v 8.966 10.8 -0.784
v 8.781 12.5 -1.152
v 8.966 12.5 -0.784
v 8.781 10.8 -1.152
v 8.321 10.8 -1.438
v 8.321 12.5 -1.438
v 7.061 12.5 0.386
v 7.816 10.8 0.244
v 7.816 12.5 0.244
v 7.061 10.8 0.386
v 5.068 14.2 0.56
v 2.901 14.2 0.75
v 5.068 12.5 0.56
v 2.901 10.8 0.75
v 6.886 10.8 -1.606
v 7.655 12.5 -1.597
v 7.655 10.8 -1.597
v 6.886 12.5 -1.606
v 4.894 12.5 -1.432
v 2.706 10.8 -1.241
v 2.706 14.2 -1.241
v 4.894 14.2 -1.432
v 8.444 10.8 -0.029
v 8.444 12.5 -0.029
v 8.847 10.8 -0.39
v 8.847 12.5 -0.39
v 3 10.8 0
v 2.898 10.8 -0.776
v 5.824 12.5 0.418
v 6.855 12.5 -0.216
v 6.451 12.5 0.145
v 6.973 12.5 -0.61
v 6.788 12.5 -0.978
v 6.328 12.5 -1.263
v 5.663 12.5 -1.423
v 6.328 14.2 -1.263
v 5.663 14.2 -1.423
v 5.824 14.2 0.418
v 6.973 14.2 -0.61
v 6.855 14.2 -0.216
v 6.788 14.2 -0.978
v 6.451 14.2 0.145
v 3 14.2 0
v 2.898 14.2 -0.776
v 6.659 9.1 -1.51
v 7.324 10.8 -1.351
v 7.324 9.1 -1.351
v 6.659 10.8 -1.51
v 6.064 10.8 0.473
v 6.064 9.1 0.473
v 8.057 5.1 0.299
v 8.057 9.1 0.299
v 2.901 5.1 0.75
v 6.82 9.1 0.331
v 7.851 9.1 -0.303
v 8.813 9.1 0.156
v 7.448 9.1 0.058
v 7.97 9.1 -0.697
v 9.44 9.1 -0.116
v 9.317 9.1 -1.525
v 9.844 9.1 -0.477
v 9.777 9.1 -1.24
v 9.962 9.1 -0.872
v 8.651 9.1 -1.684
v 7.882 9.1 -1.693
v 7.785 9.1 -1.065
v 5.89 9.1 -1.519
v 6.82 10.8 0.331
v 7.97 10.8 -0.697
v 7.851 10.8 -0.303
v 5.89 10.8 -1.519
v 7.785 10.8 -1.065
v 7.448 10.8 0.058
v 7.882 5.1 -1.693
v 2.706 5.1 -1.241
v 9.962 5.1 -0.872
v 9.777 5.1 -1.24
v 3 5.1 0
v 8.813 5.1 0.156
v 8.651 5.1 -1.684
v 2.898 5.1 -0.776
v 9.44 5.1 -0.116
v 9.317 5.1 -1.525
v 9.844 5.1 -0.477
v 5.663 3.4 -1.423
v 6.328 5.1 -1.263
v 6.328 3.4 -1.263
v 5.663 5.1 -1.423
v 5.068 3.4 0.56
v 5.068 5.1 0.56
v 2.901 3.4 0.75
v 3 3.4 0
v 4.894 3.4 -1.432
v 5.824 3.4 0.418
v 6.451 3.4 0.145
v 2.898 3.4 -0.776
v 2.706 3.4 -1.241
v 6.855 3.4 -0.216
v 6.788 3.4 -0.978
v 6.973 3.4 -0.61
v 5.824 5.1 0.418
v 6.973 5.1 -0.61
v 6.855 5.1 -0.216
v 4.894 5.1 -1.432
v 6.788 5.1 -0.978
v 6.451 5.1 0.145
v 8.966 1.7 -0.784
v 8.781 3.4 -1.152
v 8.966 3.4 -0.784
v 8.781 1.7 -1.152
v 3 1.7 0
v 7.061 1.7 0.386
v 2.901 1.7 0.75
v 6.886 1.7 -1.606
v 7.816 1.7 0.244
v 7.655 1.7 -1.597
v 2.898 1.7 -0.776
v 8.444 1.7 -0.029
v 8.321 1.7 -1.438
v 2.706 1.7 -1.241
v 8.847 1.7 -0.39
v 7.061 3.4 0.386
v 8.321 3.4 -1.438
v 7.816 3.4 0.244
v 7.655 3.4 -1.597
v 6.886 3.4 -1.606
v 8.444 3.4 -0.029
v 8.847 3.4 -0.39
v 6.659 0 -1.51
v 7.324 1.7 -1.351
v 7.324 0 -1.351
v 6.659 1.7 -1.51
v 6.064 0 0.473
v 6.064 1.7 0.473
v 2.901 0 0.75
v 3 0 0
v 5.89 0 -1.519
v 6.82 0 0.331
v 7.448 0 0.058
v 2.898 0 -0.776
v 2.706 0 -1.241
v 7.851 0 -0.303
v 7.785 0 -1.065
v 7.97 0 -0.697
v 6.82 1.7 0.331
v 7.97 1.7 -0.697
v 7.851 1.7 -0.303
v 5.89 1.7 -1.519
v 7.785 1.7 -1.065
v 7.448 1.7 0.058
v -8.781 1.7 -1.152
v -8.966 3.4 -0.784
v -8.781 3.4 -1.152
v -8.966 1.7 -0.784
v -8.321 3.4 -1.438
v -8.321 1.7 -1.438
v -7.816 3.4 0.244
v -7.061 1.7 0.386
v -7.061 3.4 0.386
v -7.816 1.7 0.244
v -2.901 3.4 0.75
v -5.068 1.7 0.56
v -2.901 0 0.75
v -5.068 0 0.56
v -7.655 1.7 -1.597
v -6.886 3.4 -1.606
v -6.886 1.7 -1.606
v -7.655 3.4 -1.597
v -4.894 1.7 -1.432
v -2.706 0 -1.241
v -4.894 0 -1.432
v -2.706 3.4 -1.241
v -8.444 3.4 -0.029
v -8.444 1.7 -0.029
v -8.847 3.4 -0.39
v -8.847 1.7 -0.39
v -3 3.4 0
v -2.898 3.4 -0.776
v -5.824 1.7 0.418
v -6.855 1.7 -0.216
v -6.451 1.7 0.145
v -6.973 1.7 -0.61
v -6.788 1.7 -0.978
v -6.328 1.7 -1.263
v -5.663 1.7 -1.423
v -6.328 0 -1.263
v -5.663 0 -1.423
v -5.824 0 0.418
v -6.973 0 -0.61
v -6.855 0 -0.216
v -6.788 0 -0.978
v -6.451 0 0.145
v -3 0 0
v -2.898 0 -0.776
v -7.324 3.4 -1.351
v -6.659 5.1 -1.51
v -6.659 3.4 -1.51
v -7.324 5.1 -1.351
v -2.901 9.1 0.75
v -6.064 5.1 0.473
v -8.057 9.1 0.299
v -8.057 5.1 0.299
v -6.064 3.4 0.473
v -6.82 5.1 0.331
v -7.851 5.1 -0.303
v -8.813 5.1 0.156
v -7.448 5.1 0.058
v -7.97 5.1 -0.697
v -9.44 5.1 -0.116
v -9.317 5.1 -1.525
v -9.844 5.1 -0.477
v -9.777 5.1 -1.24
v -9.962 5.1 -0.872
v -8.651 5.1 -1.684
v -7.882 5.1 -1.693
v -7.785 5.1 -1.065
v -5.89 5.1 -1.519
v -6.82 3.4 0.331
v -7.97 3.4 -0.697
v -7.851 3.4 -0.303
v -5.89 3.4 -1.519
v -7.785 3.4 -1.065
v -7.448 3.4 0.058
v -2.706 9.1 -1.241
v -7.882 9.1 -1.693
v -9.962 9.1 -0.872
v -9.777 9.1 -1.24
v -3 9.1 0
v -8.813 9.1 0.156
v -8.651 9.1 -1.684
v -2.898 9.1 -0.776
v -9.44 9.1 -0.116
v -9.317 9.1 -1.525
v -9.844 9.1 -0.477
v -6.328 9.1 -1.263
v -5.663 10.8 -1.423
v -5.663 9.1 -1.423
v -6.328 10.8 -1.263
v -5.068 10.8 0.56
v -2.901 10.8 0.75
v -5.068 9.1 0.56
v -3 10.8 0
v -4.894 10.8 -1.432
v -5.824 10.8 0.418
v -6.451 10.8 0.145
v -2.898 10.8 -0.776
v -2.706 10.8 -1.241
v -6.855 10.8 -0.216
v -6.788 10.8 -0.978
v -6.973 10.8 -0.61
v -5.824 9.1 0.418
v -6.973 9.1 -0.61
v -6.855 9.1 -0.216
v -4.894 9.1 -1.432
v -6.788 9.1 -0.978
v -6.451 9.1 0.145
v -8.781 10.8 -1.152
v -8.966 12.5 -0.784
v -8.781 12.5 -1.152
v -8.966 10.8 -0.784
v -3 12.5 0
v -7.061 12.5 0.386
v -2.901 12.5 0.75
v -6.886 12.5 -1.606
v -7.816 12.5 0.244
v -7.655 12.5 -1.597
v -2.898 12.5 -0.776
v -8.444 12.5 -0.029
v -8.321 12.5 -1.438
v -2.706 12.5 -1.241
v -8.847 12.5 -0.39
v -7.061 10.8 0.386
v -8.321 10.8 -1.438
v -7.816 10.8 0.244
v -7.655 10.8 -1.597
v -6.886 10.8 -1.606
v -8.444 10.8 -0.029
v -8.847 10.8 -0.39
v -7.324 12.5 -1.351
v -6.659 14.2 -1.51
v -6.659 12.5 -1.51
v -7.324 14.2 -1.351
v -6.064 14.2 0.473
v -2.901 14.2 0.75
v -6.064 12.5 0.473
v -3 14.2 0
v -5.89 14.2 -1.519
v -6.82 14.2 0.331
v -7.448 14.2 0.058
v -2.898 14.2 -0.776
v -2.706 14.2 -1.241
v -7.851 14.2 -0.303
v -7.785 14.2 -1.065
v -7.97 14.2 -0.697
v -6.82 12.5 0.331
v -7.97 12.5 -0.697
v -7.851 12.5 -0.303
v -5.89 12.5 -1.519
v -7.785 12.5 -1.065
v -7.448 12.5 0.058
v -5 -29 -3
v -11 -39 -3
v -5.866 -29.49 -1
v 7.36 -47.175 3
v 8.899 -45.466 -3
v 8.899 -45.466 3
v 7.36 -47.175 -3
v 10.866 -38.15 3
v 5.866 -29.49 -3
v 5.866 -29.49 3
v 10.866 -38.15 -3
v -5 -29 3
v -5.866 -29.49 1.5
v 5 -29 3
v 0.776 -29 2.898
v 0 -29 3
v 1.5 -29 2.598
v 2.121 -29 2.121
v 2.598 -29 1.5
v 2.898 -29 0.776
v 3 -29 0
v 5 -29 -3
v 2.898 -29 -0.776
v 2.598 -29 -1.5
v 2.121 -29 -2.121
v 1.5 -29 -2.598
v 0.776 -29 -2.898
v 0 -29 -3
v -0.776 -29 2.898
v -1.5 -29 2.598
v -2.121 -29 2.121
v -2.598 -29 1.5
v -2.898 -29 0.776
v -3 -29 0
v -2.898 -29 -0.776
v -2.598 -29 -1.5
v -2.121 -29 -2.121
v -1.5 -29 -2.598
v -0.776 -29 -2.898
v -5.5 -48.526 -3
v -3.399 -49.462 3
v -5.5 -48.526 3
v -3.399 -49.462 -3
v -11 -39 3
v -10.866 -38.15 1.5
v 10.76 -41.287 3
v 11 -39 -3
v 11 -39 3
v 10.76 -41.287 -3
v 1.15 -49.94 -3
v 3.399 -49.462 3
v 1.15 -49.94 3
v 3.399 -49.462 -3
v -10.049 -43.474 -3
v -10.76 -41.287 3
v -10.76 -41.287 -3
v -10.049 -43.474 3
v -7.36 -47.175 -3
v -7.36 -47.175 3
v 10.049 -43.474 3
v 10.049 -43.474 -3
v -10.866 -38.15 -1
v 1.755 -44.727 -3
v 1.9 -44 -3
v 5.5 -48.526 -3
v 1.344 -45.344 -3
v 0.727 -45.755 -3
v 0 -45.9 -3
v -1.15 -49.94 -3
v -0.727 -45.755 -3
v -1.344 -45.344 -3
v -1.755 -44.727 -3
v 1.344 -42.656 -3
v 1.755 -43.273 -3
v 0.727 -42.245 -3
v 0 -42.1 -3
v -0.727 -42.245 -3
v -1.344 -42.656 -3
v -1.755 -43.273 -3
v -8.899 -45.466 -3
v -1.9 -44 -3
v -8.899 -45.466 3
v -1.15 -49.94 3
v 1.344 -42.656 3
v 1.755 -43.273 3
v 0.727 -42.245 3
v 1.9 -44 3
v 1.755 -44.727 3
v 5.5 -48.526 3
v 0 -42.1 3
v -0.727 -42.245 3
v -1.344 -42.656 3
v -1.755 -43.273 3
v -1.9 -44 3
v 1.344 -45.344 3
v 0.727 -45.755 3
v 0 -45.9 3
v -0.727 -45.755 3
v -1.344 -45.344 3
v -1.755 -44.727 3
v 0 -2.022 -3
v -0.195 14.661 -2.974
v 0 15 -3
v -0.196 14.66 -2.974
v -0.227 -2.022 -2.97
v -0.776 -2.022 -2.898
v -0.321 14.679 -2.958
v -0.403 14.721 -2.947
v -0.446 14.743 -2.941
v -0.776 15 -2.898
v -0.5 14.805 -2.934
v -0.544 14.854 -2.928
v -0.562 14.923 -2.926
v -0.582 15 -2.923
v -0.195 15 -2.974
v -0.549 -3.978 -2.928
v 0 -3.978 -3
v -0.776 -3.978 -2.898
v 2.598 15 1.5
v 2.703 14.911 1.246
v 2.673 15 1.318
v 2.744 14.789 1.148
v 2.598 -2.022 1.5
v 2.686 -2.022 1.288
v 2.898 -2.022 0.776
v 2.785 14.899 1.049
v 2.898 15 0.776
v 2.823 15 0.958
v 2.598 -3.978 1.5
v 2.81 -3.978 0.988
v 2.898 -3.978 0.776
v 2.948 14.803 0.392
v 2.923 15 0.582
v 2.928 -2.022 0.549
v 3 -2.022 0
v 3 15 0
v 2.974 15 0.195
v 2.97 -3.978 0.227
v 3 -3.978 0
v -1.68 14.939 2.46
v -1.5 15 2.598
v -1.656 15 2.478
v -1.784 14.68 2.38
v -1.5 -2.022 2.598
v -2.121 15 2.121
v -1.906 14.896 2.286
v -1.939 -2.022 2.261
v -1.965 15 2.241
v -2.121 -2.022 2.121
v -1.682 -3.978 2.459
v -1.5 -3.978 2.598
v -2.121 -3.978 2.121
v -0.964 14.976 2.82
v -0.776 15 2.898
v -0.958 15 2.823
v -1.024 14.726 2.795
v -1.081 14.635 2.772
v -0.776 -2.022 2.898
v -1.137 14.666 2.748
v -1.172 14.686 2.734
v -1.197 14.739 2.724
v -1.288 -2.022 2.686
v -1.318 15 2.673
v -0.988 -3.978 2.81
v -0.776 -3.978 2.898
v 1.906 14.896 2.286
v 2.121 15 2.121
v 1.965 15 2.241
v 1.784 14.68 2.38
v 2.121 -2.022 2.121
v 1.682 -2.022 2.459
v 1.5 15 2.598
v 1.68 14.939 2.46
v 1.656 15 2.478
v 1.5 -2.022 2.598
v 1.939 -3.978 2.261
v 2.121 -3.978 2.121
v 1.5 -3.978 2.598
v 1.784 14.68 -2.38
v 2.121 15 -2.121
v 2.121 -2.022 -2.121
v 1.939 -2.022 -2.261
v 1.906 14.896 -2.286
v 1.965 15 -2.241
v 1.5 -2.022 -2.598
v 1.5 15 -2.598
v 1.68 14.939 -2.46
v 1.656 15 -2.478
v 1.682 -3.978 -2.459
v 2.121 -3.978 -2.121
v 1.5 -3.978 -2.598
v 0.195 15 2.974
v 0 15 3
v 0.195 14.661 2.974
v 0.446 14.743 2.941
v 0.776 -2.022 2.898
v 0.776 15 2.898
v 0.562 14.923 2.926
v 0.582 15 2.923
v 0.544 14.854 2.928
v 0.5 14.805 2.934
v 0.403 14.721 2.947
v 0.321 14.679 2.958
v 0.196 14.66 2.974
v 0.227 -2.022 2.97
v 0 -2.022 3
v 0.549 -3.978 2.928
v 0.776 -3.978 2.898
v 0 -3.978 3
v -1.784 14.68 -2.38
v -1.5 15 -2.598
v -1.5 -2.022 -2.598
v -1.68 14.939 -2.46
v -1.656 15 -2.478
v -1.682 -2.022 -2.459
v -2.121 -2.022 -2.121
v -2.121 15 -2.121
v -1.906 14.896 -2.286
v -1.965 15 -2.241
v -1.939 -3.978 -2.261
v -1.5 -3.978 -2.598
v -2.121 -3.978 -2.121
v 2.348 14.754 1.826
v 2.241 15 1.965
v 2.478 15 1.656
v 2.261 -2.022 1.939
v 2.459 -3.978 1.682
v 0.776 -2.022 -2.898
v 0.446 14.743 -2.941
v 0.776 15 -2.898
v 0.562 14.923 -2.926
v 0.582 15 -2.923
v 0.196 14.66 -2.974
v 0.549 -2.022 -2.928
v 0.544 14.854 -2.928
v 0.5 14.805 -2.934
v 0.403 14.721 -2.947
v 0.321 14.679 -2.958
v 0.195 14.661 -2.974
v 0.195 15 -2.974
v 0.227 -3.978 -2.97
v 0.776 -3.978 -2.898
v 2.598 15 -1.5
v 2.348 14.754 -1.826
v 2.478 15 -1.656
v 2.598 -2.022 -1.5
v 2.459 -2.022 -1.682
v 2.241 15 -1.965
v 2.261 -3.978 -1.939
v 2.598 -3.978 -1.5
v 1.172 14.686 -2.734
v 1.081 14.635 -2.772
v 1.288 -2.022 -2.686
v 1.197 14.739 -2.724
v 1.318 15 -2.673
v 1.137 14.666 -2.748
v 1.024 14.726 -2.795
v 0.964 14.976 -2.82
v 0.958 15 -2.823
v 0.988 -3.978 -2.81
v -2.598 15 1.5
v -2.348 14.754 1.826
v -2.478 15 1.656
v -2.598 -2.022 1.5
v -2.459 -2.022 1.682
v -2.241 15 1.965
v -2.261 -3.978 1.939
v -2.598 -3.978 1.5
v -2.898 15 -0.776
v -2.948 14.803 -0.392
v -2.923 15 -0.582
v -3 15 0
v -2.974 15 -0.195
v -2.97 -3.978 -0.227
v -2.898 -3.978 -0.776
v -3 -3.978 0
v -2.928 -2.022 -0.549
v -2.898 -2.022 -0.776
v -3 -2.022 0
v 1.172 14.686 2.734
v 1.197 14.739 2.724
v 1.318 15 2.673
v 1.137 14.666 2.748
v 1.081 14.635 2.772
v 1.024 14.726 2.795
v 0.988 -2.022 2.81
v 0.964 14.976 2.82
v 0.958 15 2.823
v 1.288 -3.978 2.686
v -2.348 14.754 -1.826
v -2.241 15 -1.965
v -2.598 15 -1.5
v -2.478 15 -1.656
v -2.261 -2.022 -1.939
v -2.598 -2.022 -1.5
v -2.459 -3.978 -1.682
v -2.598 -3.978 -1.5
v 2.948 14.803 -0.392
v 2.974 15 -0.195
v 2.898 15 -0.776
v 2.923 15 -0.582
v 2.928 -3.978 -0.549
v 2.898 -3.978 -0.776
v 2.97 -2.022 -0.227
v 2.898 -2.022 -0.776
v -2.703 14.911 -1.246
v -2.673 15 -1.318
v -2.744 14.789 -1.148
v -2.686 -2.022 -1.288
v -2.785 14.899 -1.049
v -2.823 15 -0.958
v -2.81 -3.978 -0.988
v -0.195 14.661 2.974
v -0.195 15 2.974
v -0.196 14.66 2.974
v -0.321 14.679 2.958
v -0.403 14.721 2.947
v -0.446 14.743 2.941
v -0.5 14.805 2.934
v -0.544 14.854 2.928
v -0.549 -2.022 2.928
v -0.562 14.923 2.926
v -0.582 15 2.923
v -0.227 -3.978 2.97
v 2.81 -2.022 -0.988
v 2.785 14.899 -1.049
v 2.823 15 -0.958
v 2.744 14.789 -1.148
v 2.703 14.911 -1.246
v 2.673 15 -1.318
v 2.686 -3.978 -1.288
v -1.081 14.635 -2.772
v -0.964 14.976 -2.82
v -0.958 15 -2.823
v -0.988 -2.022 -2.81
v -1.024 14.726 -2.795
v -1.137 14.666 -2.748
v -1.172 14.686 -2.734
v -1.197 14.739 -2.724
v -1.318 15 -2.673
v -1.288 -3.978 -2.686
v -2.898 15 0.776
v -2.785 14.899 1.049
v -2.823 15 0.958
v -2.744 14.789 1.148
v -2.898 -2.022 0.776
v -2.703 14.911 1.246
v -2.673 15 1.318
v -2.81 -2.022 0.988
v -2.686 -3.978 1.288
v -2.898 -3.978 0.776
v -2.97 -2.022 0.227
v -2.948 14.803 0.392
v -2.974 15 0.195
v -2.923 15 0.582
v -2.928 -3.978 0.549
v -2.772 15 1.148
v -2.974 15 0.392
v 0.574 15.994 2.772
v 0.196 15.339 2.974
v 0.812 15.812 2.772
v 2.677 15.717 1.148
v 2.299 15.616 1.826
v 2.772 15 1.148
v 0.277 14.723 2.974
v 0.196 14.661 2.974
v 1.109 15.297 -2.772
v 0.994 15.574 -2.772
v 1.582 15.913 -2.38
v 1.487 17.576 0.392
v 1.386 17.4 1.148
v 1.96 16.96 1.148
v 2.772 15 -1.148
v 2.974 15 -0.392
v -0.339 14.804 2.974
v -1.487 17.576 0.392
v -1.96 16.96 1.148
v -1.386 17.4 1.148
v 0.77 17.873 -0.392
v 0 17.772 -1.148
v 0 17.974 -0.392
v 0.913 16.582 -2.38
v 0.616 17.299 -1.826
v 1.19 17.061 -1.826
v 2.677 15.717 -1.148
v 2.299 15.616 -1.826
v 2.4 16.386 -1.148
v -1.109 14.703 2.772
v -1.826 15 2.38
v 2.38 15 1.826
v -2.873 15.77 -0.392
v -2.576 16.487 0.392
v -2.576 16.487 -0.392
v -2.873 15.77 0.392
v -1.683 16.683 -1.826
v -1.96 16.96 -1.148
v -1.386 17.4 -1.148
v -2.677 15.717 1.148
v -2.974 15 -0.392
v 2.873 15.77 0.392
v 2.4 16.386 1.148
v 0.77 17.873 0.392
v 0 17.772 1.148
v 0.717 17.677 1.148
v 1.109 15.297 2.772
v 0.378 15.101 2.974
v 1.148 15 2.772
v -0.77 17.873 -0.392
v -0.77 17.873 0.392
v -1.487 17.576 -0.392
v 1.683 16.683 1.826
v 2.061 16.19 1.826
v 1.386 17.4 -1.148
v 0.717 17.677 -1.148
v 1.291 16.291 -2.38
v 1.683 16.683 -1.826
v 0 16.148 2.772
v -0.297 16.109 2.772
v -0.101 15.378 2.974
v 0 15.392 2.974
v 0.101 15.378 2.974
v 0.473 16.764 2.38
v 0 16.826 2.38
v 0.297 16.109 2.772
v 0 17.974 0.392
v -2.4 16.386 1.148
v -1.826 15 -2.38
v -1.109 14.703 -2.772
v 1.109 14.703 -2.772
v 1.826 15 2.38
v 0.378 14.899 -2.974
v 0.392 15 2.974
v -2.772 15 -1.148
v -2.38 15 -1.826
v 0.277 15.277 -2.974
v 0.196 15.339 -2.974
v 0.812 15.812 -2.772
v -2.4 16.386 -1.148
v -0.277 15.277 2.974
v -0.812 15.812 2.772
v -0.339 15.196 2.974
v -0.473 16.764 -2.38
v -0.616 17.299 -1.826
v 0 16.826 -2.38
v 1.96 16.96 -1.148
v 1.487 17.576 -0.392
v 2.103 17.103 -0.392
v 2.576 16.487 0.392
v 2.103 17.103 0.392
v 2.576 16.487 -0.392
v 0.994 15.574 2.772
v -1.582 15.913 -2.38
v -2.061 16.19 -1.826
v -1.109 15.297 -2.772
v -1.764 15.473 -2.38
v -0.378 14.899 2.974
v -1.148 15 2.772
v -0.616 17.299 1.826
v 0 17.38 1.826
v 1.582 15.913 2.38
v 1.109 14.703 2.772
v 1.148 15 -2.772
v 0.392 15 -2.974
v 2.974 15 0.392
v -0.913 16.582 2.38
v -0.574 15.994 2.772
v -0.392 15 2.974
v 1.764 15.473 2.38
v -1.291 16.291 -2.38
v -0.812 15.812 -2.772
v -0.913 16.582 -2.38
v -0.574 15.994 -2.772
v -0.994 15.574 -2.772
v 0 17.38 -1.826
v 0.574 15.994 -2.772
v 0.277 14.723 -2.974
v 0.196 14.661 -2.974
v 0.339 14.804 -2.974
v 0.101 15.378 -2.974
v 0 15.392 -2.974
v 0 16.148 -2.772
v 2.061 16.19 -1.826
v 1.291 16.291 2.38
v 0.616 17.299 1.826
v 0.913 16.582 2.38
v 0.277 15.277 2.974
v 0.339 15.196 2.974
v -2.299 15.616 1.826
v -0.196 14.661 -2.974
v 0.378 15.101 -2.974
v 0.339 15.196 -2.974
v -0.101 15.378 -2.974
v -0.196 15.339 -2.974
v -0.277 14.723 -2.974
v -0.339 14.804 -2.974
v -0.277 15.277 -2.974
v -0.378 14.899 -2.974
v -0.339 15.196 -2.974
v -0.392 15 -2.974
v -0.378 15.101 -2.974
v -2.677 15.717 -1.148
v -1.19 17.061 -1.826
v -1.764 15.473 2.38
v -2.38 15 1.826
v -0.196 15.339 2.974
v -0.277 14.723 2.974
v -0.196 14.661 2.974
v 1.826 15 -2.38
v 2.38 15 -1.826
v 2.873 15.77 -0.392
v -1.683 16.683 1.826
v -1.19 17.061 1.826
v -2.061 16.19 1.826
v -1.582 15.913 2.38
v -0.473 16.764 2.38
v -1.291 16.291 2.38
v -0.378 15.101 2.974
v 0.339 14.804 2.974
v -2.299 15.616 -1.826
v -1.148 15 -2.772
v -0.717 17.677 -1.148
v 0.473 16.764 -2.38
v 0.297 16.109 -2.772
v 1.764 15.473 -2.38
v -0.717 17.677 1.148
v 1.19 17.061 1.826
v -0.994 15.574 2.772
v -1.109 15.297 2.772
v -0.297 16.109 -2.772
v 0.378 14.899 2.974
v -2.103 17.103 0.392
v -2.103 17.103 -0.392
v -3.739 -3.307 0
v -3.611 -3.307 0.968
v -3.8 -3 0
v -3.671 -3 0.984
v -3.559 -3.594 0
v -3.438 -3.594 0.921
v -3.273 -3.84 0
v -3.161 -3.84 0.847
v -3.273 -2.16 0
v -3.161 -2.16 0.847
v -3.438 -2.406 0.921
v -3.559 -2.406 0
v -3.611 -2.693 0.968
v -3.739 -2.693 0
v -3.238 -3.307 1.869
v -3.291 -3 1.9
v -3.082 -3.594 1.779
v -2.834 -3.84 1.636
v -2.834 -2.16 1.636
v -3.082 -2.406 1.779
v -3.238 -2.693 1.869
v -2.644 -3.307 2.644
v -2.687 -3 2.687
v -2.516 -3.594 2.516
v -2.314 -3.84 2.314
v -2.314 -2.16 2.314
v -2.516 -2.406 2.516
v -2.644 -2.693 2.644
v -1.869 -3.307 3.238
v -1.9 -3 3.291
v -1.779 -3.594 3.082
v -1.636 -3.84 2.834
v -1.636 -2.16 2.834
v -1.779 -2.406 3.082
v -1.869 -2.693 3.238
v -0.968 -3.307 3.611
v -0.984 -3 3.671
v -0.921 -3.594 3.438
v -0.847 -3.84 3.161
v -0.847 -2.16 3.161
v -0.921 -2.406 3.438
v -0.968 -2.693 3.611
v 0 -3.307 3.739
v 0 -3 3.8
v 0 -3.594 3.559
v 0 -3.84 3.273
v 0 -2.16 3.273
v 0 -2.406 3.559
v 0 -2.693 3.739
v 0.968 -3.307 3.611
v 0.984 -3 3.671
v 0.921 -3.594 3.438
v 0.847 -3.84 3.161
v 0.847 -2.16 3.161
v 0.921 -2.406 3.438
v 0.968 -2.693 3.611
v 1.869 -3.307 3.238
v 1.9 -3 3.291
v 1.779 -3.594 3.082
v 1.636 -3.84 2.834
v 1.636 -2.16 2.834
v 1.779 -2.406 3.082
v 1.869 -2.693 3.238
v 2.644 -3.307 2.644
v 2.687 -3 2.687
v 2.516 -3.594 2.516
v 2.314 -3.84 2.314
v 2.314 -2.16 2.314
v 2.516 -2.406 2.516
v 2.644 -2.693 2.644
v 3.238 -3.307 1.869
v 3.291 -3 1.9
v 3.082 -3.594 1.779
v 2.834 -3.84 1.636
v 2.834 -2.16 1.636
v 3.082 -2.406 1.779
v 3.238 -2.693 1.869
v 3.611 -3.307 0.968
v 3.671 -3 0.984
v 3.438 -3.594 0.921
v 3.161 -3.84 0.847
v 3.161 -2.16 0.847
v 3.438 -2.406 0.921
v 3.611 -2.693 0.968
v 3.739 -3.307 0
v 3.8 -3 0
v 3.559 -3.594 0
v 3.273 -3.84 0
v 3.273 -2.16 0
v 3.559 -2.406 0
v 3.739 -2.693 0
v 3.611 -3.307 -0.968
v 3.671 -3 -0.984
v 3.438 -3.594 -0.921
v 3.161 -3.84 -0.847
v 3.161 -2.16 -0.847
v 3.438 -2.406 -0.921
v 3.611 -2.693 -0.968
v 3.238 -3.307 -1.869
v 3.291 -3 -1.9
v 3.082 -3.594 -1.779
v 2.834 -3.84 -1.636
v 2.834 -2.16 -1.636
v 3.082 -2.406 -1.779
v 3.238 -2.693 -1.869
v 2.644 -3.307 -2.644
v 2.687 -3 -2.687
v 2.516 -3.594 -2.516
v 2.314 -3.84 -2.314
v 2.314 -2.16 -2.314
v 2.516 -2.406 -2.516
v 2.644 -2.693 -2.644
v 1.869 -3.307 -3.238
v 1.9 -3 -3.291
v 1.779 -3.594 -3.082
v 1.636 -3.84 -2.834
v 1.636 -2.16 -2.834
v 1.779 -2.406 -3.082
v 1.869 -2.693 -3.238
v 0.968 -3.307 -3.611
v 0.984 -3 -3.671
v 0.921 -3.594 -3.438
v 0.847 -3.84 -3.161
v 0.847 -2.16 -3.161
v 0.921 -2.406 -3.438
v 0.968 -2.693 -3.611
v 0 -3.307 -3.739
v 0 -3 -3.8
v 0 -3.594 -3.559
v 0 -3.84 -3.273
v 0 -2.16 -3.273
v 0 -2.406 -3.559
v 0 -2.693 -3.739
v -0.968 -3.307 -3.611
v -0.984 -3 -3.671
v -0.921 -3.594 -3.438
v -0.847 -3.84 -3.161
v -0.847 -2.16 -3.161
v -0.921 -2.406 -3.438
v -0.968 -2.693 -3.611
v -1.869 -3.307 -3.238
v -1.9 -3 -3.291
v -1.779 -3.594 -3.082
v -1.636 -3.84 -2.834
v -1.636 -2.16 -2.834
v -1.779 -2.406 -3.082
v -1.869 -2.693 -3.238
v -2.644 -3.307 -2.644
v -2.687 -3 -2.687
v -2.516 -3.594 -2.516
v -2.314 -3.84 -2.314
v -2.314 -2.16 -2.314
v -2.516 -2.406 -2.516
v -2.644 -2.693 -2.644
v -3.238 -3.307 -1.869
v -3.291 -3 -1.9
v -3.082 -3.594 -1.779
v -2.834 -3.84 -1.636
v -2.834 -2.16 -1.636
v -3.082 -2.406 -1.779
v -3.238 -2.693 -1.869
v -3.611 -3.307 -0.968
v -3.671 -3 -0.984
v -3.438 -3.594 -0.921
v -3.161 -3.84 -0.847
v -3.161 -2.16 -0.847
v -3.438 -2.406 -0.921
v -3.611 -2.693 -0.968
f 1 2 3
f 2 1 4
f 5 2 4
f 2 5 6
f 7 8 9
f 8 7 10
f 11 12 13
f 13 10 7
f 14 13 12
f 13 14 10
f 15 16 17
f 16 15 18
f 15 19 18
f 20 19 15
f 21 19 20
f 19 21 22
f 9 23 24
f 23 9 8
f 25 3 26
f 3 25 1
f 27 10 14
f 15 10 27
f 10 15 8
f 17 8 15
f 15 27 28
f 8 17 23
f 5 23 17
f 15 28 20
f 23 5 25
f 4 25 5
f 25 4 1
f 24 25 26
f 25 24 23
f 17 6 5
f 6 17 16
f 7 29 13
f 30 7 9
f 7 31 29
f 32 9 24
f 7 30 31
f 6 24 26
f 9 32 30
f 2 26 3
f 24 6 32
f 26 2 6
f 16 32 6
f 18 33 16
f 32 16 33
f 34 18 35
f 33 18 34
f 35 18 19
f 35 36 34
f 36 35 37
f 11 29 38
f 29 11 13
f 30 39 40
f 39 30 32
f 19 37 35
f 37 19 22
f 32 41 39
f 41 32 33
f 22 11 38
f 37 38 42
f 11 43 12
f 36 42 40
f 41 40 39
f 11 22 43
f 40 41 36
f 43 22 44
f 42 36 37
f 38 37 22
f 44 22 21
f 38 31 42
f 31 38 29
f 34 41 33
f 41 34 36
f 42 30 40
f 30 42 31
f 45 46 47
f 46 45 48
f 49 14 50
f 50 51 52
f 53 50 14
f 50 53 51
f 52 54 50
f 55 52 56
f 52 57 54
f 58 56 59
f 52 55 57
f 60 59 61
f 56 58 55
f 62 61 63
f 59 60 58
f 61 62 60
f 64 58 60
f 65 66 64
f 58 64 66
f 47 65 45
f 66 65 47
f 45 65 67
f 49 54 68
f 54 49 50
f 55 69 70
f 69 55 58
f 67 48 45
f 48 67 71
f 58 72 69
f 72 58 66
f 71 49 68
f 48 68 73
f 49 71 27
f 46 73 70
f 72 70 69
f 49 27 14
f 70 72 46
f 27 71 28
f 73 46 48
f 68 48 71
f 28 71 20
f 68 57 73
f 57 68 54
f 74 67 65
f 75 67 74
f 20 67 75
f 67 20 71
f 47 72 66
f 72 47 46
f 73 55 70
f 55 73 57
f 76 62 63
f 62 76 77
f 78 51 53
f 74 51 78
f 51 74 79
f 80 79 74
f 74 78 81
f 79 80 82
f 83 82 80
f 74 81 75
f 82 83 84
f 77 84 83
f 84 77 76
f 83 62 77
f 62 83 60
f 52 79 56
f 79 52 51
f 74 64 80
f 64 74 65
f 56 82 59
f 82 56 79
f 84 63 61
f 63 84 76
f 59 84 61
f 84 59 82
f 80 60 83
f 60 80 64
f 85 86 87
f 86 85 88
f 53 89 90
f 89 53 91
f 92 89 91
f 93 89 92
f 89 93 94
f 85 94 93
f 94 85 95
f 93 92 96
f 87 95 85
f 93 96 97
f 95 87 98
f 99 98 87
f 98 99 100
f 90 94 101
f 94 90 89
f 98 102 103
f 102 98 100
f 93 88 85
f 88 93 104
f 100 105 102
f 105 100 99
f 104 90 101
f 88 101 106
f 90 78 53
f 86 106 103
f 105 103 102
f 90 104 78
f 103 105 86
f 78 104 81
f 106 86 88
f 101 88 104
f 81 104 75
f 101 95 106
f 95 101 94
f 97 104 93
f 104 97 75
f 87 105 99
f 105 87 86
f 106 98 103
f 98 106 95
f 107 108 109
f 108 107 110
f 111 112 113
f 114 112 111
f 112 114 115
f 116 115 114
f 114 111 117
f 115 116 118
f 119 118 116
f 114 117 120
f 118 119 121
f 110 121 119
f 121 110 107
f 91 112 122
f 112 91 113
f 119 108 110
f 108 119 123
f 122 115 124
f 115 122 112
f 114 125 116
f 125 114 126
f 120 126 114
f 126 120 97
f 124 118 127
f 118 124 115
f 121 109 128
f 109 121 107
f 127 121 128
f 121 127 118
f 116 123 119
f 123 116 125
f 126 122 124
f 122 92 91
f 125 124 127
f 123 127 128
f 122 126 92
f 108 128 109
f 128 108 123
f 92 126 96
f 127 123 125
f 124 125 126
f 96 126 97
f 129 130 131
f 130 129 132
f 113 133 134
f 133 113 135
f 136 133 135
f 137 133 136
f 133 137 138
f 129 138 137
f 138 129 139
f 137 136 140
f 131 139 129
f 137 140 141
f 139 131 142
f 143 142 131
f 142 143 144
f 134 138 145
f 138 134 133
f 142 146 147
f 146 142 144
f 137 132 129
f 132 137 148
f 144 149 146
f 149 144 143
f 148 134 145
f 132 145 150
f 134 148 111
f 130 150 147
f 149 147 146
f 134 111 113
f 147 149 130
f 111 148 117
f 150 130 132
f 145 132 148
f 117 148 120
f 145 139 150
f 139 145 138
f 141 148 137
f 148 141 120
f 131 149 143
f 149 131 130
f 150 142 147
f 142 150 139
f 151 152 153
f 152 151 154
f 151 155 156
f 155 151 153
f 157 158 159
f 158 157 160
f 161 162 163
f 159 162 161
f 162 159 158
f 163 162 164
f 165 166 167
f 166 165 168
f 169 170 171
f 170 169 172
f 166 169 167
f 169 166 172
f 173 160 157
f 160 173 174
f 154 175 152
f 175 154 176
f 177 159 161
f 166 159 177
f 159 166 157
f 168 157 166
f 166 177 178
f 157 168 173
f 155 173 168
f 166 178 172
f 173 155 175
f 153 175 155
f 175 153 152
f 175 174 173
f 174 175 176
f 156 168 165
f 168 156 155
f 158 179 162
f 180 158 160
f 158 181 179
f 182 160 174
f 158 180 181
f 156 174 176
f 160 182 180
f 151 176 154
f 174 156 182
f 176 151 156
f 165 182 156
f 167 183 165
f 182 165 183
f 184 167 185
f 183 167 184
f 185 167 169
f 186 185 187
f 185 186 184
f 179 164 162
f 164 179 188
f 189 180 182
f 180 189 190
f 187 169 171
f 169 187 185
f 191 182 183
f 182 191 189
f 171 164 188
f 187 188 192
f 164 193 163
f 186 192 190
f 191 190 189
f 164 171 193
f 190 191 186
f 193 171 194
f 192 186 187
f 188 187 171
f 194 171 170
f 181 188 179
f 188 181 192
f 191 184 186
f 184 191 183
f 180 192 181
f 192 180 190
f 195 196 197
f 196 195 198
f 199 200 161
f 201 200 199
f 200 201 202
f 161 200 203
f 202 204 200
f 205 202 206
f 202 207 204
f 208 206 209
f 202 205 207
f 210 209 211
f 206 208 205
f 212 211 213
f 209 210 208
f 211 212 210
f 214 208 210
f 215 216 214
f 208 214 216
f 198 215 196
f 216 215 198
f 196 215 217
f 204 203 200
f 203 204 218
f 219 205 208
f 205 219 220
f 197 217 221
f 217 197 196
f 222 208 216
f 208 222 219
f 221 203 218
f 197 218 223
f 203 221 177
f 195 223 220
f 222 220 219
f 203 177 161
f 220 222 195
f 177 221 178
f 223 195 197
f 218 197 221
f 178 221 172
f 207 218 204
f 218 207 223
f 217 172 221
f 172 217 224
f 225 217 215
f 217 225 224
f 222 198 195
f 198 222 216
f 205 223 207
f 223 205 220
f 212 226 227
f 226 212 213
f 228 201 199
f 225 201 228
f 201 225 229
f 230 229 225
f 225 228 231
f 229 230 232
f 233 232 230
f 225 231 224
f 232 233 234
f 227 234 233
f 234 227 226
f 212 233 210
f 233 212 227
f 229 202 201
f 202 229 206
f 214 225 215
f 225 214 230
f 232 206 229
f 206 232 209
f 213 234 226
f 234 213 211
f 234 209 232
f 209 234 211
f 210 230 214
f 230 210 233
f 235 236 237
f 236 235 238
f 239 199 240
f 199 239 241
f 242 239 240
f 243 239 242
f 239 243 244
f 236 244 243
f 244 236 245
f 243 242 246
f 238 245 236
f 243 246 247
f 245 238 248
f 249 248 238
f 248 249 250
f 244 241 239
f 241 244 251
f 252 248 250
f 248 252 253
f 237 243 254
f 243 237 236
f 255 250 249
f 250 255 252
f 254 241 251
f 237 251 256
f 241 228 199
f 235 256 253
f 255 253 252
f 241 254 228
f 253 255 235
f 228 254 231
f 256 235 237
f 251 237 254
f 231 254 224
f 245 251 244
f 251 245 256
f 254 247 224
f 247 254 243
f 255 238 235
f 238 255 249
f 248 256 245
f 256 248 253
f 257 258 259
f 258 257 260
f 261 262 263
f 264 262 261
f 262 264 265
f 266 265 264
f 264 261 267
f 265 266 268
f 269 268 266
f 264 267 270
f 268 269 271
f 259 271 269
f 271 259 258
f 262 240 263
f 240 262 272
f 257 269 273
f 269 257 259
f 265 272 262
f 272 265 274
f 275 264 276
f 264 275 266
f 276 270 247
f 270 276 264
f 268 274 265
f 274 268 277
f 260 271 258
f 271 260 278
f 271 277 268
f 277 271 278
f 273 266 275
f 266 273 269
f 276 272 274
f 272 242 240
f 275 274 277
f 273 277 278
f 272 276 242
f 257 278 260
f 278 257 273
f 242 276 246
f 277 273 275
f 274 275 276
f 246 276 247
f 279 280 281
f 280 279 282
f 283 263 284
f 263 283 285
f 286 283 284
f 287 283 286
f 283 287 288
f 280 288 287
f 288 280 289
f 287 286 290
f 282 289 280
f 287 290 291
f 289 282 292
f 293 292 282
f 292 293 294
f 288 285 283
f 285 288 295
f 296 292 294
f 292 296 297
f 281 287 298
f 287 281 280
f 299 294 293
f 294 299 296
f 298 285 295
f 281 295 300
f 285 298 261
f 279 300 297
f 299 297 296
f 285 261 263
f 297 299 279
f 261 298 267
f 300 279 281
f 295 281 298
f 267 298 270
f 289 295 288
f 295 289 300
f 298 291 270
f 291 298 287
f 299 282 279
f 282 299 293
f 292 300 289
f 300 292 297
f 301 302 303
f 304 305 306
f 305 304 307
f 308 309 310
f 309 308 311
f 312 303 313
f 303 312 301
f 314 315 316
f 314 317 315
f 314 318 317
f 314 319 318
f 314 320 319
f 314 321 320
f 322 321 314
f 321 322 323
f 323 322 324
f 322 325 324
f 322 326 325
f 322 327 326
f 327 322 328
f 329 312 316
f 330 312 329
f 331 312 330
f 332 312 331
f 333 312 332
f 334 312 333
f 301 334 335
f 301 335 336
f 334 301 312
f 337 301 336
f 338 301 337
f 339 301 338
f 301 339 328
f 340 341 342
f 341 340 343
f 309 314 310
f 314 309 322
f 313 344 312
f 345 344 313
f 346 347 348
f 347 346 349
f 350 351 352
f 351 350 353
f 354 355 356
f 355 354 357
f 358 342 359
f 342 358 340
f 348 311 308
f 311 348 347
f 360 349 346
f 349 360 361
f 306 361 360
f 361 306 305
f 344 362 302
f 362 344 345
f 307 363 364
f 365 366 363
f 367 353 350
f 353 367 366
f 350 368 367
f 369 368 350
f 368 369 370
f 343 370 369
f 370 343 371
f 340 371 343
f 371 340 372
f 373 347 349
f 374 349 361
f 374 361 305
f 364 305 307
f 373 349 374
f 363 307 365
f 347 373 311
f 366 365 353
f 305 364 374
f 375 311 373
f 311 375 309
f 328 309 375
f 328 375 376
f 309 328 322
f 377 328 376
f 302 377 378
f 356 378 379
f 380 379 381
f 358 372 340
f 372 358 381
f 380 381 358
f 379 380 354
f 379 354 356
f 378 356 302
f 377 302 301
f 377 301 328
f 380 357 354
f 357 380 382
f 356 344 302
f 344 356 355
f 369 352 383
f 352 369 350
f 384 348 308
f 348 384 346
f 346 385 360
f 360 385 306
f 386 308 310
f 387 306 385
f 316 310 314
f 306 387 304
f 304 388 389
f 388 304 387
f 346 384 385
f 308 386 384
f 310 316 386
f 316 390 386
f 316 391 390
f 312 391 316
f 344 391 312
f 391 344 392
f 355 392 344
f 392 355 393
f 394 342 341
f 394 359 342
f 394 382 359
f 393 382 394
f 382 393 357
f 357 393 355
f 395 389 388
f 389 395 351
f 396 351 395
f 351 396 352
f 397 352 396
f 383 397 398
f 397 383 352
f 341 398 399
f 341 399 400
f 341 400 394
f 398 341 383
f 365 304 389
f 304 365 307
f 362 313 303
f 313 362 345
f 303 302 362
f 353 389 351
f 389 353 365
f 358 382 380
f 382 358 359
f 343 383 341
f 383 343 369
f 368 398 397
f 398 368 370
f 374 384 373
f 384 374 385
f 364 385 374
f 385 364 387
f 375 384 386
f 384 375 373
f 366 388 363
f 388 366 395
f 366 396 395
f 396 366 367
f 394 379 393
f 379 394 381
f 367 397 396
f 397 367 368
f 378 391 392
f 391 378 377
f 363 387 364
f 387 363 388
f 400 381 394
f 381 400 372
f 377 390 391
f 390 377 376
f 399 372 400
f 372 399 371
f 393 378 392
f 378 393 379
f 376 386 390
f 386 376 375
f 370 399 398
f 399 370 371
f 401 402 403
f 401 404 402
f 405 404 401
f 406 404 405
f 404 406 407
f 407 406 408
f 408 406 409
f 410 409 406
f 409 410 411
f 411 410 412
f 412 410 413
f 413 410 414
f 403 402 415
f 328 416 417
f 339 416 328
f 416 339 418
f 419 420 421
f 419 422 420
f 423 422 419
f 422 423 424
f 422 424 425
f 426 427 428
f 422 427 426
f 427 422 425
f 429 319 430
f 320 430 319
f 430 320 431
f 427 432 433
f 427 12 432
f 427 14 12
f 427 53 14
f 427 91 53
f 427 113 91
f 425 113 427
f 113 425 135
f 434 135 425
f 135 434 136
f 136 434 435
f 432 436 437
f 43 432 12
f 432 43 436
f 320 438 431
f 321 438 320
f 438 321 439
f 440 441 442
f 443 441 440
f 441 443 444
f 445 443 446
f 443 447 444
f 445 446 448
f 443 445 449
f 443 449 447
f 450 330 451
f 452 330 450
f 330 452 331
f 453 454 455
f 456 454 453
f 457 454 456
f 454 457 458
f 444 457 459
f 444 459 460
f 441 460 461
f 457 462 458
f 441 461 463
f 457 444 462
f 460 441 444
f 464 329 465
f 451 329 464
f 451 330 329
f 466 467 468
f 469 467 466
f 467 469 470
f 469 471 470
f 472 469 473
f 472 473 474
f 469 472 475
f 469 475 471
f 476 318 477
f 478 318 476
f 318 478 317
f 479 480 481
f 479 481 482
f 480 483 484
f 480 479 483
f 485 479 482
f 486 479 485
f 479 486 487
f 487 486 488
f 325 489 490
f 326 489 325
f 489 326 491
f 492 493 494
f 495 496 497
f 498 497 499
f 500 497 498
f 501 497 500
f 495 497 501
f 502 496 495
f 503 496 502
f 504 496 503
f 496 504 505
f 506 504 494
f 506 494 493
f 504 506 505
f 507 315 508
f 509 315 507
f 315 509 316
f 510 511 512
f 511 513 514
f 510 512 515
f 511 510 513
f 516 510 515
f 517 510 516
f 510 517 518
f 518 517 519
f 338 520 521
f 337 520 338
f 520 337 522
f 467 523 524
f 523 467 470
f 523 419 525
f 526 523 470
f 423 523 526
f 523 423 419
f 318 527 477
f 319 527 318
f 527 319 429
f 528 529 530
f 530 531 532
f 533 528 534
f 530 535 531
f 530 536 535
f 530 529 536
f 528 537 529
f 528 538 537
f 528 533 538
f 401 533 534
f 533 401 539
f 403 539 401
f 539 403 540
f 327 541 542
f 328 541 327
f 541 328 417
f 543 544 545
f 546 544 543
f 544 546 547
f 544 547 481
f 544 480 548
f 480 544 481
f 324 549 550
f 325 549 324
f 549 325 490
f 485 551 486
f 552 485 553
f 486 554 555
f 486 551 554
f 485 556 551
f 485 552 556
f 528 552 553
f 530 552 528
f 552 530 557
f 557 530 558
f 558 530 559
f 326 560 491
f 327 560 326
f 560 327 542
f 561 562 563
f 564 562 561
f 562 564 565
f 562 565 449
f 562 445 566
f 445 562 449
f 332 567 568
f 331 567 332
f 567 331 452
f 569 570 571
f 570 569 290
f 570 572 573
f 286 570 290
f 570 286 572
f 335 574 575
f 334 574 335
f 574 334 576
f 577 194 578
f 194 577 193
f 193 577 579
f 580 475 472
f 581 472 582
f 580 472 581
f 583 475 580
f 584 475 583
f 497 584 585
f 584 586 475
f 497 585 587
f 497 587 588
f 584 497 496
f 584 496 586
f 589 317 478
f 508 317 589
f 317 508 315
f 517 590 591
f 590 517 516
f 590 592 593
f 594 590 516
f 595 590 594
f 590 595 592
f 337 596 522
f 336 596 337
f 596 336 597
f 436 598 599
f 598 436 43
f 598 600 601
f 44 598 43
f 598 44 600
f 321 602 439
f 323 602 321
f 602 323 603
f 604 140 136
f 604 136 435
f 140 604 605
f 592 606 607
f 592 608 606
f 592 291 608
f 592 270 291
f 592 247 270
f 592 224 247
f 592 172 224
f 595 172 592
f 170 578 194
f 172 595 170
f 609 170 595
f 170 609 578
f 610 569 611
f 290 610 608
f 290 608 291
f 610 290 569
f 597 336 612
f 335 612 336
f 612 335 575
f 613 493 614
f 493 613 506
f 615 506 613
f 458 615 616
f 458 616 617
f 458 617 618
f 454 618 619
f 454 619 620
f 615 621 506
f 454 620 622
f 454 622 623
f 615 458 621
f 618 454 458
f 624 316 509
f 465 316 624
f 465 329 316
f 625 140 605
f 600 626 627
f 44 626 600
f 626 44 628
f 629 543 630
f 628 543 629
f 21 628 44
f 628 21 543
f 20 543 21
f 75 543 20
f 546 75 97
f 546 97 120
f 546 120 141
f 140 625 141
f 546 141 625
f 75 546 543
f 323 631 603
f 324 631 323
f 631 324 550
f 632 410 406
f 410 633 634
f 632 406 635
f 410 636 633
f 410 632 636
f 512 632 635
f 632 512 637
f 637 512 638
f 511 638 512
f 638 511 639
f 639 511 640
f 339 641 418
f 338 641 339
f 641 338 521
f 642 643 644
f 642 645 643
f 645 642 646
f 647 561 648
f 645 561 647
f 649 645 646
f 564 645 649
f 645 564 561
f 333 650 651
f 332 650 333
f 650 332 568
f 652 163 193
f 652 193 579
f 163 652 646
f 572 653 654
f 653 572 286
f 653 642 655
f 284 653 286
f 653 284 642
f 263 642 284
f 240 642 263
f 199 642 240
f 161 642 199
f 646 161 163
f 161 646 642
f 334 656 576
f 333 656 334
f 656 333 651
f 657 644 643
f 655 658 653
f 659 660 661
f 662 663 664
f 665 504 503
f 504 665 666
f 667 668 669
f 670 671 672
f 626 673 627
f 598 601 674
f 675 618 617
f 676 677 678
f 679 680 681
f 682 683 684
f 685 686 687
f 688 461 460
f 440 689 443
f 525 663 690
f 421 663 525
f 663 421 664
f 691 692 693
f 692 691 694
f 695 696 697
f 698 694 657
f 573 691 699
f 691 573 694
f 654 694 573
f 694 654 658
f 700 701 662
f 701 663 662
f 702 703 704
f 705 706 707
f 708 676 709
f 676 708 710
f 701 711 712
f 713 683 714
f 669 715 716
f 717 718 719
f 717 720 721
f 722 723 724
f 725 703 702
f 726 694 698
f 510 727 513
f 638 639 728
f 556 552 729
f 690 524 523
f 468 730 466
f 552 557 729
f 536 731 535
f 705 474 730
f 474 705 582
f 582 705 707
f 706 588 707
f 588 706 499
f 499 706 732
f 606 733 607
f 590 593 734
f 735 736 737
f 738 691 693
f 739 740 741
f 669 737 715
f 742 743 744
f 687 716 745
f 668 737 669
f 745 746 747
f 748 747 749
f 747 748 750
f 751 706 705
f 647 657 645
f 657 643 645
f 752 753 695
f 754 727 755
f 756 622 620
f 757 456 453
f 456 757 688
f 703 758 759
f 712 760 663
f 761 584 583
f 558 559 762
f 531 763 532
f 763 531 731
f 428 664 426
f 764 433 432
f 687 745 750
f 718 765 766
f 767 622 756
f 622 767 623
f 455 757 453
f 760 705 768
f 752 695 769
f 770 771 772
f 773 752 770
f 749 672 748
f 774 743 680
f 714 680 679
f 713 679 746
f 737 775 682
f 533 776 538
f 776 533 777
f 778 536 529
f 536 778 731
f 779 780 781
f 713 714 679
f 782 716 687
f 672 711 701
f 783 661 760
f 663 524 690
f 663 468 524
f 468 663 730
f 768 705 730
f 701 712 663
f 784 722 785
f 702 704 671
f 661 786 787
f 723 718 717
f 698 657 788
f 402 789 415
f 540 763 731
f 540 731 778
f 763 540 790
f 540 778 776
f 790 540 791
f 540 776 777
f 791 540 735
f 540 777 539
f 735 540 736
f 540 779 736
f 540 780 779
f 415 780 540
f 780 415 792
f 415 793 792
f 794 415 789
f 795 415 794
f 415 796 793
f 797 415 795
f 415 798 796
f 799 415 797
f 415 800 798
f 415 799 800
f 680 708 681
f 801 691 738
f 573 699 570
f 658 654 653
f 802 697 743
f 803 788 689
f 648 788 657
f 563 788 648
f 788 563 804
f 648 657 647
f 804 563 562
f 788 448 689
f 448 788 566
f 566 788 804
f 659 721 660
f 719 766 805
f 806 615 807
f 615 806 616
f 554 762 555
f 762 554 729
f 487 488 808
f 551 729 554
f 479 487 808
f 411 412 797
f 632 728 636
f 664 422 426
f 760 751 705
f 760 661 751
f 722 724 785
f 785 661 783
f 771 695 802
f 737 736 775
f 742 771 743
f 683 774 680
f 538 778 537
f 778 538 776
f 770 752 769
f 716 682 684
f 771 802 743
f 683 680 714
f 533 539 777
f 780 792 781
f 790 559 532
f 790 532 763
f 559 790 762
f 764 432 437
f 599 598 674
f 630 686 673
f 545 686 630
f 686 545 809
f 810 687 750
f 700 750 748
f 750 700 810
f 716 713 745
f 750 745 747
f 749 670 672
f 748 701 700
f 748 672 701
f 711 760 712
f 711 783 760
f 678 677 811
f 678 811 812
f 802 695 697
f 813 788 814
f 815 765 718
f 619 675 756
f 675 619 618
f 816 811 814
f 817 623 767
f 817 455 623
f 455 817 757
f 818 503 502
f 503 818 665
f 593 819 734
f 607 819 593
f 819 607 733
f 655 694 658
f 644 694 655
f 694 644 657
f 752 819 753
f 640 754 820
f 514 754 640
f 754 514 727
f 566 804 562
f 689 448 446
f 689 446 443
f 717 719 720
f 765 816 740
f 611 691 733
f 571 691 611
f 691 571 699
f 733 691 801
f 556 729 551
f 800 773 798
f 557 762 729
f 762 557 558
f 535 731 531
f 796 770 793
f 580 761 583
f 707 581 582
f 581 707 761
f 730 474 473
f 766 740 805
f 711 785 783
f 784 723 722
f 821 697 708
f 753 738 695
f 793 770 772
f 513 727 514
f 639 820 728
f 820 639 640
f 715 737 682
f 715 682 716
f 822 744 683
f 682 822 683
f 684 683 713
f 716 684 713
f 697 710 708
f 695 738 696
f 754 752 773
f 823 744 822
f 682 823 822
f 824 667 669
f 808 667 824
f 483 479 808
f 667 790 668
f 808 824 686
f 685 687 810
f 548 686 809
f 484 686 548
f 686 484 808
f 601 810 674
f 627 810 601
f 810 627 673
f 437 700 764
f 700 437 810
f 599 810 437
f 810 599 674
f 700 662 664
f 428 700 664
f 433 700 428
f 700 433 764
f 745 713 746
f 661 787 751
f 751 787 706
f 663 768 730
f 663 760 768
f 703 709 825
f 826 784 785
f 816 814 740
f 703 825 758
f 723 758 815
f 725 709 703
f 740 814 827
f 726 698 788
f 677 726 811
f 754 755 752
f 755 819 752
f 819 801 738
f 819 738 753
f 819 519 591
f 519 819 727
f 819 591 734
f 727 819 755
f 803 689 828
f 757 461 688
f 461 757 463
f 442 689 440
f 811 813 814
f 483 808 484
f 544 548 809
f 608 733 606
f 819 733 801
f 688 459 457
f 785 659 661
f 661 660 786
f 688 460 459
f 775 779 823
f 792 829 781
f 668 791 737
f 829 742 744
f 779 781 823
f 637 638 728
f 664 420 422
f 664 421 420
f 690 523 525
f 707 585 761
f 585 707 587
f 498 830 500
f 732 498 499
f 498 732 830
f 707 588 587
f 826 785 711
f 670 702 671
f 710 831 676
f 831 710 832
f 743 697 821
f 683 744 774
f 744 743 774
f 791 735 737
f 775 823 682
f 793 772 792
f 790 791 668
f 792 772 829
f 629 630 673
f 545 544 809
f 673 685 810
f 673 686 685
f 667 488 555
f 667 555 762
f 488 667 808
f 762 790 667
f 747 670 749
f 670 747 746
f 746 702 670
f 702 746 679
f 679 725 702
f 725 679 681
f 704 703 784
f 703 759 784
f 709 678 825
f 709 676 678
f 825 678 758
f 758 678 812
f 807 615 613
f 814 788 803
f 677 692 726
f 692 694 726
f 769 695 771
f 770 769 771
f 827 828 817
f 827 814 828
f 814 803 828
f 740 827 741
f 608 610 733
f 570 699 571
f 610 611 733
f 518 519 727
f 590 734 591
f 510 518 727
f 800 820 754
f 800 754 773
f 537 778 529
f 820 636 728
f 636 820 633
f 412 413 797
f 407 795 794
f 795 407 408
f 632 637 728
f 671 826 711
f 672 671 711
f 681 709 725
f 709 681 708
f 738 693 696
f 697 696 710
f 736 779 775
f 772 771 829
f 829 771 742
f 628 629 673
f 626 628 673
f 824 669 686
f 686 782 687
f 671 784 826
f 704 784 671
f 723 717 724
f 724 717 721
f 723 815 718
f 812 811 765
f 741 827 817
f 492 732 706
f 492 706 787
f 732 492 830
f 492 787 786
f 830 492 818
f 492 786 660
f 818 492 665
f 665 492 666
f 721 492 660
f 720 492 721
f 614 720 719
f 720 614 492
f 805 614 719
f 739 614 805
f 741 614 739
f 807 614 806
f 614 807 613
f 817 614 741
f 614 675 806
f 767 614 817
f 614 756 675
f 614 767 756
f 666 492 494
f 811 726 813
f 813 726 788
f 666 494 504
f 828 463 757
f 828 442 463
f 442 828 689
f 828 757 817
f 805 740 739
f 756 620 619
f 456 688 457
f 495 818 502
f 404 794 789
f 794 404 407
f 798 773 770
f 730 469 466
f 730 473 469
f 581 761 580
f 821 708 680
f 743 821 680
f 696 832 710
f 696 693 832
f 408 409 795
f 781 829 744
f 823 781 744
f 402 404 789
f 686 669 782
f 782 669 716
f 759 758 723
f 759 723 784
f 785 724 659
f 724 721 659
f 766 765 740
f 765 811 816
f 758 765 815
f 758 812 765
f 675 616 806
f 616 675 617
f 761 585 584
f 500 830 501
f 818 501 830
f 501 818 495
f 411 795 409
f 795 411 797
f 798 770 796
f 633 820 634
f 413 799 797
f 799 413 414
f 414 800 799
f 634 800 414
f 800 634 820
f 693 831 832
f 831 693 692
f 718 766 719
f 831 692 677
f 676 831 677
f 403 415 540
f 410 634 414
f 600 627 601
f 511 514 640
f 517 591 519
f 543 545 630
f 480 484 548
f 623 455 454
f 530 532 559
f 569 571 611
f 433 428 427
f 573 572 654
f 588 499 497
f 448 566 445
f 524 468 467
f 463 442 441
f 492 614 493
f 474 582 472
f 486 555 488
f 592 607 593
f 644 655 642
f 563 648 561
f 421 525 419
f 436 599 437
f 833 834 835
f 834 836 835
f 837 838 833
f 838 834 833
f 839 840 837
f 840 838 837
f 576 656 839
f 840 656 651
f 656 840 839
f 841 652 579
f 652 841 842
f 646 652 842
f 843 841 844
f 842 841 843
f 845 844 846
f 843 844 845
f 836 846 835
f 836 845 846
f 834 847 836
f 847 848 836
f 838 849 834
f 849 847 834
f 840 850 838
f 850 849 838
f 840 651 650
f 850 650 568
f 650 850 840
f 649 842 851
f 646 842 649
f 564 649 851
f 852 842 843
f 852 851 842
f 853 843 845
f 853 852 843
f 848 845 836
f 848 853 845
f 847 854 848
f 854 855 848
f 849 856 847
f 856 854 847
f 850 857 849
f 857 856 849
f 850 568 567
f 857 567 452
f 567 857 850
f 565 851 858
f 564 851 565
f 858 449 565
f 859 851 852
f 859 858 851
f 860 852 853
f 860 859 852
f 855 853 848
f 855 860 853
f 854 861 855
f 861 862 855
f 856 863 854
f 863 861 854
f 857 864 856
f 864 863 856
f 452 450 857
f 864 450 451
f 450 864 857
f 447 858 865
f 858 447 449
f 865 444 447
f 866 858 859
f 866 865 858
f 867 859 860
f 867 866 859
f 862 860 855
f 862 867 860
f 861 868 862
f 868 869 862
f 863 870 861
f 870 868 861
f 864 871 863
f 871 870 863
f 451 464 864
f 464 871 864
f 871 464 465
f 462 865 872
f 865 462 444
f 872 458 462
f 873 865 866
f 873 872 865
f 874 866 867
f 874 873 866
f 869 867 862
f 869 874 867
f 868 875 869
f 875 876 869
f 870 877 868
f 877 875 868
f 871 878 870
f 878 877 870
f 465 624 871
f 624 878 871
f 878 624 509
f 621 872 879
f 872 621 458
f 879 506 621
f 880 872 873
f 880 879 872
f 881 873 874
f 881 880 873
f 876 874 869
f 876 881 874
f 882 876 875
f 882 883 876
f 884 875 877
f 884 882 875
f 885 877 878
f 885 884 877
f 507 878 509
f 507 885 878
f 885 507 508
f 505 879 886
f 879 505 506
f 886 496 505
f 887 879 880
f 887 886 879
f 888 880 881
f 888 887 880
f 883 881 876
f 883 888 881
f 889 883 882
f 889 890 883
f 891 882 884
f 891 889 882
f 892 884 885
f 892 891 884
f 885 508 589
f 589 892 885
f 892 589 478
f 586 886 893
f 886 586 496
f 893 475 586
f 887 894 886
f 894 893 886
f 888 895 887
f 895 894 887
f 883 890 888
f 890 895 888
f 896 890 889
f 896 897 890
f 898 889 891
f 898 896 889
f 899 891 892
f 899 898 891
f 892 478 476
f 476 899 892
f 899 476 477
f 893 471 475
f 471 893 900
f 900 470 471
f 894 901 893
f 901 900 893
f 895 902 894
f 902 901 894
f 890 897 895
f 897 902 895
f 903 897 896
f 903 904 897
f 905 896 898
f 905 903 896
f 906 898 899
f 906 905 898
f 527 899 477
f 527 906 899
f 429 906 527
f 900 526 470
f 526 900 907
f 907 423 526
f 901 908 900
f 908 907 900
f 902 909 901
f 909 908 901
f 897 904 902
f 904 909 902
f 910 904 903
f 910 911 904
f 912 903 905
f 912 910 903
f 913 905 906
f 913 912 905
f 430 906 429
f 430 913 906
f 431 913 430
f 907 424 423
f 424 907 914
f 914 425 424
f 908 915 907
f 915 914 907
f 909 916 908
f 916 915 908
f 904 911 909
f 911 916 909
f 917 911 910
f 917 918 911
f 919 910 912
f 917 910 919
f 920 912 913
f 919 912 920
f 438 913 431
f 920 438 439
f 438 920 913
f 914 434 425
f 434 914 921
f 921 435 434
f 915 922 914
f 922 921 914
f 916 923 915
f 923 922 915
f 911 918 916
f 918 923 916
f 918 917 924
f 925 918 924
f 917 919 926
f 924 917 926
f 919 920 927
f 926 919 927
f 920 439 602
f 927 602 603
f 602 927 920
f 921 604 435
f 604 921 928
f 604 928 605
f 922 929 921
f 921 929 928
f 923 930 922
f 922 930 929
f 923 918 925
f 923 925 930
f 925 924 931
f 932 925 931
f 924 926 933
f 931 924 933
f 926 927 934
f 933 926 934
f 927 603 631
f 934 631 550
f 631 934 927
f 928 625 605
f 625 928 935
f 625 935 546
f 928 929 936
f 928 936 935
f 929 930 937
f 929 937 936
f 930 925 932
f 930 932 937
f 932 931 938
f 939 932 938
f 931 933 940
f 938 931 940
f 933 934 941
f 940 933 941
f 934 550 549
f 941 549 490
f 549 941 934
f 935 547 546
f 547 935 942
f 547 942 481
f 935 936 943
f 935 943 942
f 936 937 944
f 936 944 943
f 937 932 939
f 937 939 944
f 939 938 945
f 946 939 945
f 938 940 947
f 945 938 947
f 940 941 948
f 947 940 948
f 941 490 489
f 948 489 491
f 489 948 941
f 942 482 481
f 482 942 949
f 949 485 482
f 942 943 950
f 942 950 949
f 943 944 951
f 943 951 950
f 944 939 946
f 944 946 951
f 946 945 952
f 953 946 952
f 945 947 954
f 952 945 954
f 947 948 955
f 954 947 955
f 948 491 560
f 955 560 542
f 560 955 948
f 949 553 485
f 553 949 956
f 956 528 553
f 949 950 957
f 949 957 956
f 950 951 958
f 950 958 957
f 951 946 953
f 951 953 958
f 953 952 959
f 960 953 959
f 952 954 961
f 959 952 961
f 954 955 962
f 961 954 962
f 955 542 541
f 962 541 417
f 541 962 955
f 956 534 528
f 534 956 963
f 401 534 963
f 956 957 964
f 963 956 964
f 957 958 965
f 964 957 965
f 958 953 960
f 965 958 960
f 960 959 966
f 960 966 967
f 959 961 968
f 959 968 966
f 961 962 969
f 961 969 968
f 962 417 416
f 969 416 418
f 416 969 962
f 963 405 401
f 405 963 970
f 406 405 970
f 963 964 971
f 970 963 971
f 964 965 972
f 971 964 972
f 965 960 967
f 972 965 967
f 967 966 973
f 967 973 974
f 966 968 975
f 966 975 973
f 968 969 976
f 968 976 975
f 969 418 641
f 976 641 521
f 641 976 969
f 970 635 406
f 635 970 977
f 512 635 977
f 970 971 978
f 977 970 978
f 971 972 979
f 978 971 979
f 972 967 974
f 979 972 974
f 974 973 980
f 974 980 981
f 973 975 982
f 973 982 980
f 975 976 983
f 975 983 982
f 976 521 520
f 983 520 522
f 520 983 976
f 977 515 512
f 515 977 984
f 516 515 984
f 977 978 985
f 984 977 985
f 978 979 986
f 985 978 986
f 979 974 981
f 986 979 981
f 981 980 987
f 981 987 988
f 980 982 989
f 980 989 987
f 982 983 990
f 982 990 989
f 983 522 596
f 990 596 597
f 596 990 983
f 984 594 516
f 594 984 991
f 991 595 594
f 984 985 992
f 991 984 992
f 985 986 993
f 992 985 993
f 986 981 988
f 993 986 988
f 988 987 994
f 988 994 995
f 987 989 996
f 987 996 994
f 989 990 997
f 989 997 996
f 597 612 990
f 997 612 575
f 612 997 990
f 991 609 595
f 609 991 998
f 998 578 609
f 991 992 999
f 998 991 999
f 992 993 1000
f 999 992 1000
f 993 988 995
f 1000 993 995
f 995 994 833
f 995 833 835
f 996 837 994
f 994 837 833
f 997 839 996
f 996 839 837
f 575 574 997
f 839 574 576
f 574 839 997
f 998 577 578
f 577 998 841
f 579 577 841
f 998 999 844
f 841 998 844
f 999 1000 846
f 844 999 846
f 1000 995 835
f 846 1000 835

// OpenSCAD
p2=7+2;
p1=5+2;
p3=6+2;
p4=5+2;
p6=6+2;
p5=7+2;
centro=10;


rotate([0,5,0])translate([0,0,-1])paletas(p1,p2,p3,p4,p5,p6,centro);



//rotate([0,-5,0])translate([-10,0,-1])
translate([0,14.2,0])rotate([180,-185,])translate([0,0,-1])paletas(p1,p2,p3,p4,p5,p6,centro);

//#cube([19.5,10,1],center=true);

translate([0,-4,0])rotate([90,0,0])cylinder(r=6/2,h=26,$fn=24);
translate([0,15,0])sphere(r=6/2,$fn=24);





translate([0,18-3,0])rotate([90,0,0])cylinder(r=6/2,h=20-3+5,$fn=24);
translate([0,15,0])sphere(r=6/2,$fn=24);

//translate([0,-28,0])sphere(r=4.6/2,$fn=24);

//toroide durante el bracito
#translate([0,-3,0])scale([1,0.66,1])rotate([90,0,0])rotate_extrude(convexity = 10, $fn = 24)
translate([2, 0, 0])
circle(r = 3.6/2, $fn = 24);

/////// agarre de arriba
translate([0,20,-1])
difference(){
hull(){

translate([0,-50,0]){
    translate([-10/2,0,0])cube([10,1,2.5]);
    translate([-10,-8.65,0])rotate([0,0,60])cube([10,1,2.5]);
}

translate([0,0,-2])
mirror([1,0,0])
translate([0,-50,0]){
    translate([-10/2,0,0])cube([10,1,6]);
    translate([-10,-8.65,0])rotate([0,0,60])cube([10,1,6]);
}

translate([0,0,-2])
translate([0,-59,0])
difference(){
    cylinder(r=22/2,h=6);
    translate([-20,0,-1])cube([60,50,10]);
}
}
translate([0,-68+4,-10])cylinder(r=3.8/2,h=20,$fn=16);
}

module paletas(p1,p2,p3,p4,p5,p6,centro){
    placas=1.7;
    espacio=4;

    paleta(p6,placas);
    translate([0,placas,0]){
    paleta(p5,placas);
    translate([0,placas,0]){
    paleta(p4,placas);
    translate([0,placas,0]){
    paleta(centro,espacio);
    translate([0,espacio,0]){
    paleta(p3,placas);
    translate([0,placas,0]){
    paleta(p2,placas);
    translate([0,placas,0]){
    paleta(p1,placas);
    }}}}}}
    
}





module paleta(prof,ancho){
    hull(){
        cube([1,ancho,2]);
        translate([prof,0,0])translate([-2,0,1])rotate([-90,0,0])scale([2,1,1])cylinder(r=1,h=ancho,$fn=16);
    }
}
